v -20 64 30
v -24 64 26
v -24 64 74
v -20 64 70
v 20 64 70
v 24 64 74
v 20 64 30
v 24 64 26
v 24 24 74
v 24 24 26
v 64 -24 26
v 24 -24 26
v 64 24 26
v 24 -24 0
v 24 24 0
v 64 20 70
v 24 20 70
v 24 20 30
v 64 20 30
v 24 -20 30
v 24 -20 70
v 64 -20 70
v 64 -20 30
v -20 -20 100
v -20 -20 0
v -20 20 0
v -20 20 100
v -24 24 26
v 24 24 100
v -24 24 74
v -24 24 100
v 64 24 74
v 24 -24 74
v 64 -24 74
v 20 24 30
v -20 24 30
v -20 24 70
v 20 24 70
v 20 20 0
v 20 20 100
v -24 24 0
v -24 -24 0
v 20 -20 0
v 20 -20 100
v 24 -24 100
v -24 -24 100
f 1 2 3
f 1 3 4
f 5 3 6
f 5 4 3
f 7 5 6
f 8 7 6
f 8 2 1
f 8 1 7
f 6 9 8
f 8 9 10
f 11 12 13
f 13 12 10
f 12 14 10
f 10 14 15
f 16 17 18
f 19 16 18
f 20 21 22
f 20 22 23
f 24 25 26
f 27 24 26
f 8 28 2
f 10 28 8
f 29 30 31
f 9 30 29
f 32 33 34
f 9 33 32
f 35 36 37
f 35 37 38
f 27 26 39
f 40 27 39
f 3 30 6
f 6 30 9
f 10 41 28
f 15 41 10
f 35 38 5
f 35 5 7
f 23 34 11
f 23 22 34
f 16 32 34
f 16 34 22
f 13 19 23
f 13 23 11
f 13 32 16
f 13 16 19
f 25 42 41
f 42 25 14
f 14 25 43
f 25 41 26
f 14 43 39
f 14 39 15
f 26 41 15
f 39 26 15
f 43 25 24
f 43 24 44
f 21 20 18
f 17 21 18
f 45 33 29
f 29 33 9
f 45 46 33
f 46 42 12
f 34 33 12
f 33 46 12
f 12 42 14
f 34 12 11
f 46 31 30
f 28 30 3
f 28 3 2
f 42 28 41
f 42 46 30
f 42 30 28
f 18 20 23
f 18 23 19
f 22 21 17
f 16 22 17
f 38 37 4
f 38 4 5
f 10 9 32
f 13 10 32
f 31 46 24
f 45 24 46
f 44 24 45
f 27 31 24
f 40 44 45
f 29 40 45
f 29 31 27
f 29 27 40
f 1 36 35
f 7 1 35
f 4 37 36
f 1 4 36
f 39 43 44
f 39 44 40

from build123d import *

# Parameters (mm, degrees)
SKETCH_2_W      = 48
SKETCH_2_H      = 48
SKETCH_2_W_2    = 40
SKETCH_2_H_2    = 40
EXTRUDE_1_DEPTH = 100
SKETCH_3_W      = 48
SKETCH_3_H      = 48
SKETCH_3_W_2    = 40
SKETCH_3_H_2    = 40
EXTRUDE_2_DEPTH = 40
SKETCH_4_W      = 48
SKETCH_4_H      = 48
SKETCH_4_W_2    = 40
SKETCH_4_H_2    = 40
EXTRUDE_3_DEPTH = 40


with BuildPart() as part:
    # 草图2 → 凸台-拉伸1 (new body)
    with BuildSketch(Plane.XY):
        Rectangle(SKETCH_2_W, SKETCH_2_H)
        Rectangle(SKETCH_2_W_2, SKETCH_2_H_2, mode=Mode.SUBTRACT)
    extrude(amount=EXTRUDE_1_DEPTH)

    # 草图3 → 凸台-拉伸2 (add)
    with BuildSketch(Plane(origin=(24, 0, 0), x_dir=(0, 0, -1), z_dir=(1, 0, 0))):
        with Locations((-50, 0)):
            Rectangle(SKETCH_3_W, SKETCH_3_H)
        with Locations((-50, 0)):
            Rectangle(SKETCH_3_W_2, SKETCH_3_H_2, mode=Mode.SUBTRACT)
    extrude(amount=EXTRUDE_2_DEPTH)

    # 草图4 → 凸台-拉伸3 (add)
    with BuildSketch(Plane(origin=(0, 24, 0), x_dir=(1, 0, 0), z_dir=(0, 1, 0))):
        with Locations((0, -50)):
            Rectangle(SKETCH_4_W, SKETCH_4_H)
        with Locations((0, -50)):
            Rectangle(SKETCH_4_W_2, SKETCH_4_H_2, mode=Mode.SUBTRACT)
    extrude(amount=EXTRUDE_3_DEPTH)


solid = part.part
